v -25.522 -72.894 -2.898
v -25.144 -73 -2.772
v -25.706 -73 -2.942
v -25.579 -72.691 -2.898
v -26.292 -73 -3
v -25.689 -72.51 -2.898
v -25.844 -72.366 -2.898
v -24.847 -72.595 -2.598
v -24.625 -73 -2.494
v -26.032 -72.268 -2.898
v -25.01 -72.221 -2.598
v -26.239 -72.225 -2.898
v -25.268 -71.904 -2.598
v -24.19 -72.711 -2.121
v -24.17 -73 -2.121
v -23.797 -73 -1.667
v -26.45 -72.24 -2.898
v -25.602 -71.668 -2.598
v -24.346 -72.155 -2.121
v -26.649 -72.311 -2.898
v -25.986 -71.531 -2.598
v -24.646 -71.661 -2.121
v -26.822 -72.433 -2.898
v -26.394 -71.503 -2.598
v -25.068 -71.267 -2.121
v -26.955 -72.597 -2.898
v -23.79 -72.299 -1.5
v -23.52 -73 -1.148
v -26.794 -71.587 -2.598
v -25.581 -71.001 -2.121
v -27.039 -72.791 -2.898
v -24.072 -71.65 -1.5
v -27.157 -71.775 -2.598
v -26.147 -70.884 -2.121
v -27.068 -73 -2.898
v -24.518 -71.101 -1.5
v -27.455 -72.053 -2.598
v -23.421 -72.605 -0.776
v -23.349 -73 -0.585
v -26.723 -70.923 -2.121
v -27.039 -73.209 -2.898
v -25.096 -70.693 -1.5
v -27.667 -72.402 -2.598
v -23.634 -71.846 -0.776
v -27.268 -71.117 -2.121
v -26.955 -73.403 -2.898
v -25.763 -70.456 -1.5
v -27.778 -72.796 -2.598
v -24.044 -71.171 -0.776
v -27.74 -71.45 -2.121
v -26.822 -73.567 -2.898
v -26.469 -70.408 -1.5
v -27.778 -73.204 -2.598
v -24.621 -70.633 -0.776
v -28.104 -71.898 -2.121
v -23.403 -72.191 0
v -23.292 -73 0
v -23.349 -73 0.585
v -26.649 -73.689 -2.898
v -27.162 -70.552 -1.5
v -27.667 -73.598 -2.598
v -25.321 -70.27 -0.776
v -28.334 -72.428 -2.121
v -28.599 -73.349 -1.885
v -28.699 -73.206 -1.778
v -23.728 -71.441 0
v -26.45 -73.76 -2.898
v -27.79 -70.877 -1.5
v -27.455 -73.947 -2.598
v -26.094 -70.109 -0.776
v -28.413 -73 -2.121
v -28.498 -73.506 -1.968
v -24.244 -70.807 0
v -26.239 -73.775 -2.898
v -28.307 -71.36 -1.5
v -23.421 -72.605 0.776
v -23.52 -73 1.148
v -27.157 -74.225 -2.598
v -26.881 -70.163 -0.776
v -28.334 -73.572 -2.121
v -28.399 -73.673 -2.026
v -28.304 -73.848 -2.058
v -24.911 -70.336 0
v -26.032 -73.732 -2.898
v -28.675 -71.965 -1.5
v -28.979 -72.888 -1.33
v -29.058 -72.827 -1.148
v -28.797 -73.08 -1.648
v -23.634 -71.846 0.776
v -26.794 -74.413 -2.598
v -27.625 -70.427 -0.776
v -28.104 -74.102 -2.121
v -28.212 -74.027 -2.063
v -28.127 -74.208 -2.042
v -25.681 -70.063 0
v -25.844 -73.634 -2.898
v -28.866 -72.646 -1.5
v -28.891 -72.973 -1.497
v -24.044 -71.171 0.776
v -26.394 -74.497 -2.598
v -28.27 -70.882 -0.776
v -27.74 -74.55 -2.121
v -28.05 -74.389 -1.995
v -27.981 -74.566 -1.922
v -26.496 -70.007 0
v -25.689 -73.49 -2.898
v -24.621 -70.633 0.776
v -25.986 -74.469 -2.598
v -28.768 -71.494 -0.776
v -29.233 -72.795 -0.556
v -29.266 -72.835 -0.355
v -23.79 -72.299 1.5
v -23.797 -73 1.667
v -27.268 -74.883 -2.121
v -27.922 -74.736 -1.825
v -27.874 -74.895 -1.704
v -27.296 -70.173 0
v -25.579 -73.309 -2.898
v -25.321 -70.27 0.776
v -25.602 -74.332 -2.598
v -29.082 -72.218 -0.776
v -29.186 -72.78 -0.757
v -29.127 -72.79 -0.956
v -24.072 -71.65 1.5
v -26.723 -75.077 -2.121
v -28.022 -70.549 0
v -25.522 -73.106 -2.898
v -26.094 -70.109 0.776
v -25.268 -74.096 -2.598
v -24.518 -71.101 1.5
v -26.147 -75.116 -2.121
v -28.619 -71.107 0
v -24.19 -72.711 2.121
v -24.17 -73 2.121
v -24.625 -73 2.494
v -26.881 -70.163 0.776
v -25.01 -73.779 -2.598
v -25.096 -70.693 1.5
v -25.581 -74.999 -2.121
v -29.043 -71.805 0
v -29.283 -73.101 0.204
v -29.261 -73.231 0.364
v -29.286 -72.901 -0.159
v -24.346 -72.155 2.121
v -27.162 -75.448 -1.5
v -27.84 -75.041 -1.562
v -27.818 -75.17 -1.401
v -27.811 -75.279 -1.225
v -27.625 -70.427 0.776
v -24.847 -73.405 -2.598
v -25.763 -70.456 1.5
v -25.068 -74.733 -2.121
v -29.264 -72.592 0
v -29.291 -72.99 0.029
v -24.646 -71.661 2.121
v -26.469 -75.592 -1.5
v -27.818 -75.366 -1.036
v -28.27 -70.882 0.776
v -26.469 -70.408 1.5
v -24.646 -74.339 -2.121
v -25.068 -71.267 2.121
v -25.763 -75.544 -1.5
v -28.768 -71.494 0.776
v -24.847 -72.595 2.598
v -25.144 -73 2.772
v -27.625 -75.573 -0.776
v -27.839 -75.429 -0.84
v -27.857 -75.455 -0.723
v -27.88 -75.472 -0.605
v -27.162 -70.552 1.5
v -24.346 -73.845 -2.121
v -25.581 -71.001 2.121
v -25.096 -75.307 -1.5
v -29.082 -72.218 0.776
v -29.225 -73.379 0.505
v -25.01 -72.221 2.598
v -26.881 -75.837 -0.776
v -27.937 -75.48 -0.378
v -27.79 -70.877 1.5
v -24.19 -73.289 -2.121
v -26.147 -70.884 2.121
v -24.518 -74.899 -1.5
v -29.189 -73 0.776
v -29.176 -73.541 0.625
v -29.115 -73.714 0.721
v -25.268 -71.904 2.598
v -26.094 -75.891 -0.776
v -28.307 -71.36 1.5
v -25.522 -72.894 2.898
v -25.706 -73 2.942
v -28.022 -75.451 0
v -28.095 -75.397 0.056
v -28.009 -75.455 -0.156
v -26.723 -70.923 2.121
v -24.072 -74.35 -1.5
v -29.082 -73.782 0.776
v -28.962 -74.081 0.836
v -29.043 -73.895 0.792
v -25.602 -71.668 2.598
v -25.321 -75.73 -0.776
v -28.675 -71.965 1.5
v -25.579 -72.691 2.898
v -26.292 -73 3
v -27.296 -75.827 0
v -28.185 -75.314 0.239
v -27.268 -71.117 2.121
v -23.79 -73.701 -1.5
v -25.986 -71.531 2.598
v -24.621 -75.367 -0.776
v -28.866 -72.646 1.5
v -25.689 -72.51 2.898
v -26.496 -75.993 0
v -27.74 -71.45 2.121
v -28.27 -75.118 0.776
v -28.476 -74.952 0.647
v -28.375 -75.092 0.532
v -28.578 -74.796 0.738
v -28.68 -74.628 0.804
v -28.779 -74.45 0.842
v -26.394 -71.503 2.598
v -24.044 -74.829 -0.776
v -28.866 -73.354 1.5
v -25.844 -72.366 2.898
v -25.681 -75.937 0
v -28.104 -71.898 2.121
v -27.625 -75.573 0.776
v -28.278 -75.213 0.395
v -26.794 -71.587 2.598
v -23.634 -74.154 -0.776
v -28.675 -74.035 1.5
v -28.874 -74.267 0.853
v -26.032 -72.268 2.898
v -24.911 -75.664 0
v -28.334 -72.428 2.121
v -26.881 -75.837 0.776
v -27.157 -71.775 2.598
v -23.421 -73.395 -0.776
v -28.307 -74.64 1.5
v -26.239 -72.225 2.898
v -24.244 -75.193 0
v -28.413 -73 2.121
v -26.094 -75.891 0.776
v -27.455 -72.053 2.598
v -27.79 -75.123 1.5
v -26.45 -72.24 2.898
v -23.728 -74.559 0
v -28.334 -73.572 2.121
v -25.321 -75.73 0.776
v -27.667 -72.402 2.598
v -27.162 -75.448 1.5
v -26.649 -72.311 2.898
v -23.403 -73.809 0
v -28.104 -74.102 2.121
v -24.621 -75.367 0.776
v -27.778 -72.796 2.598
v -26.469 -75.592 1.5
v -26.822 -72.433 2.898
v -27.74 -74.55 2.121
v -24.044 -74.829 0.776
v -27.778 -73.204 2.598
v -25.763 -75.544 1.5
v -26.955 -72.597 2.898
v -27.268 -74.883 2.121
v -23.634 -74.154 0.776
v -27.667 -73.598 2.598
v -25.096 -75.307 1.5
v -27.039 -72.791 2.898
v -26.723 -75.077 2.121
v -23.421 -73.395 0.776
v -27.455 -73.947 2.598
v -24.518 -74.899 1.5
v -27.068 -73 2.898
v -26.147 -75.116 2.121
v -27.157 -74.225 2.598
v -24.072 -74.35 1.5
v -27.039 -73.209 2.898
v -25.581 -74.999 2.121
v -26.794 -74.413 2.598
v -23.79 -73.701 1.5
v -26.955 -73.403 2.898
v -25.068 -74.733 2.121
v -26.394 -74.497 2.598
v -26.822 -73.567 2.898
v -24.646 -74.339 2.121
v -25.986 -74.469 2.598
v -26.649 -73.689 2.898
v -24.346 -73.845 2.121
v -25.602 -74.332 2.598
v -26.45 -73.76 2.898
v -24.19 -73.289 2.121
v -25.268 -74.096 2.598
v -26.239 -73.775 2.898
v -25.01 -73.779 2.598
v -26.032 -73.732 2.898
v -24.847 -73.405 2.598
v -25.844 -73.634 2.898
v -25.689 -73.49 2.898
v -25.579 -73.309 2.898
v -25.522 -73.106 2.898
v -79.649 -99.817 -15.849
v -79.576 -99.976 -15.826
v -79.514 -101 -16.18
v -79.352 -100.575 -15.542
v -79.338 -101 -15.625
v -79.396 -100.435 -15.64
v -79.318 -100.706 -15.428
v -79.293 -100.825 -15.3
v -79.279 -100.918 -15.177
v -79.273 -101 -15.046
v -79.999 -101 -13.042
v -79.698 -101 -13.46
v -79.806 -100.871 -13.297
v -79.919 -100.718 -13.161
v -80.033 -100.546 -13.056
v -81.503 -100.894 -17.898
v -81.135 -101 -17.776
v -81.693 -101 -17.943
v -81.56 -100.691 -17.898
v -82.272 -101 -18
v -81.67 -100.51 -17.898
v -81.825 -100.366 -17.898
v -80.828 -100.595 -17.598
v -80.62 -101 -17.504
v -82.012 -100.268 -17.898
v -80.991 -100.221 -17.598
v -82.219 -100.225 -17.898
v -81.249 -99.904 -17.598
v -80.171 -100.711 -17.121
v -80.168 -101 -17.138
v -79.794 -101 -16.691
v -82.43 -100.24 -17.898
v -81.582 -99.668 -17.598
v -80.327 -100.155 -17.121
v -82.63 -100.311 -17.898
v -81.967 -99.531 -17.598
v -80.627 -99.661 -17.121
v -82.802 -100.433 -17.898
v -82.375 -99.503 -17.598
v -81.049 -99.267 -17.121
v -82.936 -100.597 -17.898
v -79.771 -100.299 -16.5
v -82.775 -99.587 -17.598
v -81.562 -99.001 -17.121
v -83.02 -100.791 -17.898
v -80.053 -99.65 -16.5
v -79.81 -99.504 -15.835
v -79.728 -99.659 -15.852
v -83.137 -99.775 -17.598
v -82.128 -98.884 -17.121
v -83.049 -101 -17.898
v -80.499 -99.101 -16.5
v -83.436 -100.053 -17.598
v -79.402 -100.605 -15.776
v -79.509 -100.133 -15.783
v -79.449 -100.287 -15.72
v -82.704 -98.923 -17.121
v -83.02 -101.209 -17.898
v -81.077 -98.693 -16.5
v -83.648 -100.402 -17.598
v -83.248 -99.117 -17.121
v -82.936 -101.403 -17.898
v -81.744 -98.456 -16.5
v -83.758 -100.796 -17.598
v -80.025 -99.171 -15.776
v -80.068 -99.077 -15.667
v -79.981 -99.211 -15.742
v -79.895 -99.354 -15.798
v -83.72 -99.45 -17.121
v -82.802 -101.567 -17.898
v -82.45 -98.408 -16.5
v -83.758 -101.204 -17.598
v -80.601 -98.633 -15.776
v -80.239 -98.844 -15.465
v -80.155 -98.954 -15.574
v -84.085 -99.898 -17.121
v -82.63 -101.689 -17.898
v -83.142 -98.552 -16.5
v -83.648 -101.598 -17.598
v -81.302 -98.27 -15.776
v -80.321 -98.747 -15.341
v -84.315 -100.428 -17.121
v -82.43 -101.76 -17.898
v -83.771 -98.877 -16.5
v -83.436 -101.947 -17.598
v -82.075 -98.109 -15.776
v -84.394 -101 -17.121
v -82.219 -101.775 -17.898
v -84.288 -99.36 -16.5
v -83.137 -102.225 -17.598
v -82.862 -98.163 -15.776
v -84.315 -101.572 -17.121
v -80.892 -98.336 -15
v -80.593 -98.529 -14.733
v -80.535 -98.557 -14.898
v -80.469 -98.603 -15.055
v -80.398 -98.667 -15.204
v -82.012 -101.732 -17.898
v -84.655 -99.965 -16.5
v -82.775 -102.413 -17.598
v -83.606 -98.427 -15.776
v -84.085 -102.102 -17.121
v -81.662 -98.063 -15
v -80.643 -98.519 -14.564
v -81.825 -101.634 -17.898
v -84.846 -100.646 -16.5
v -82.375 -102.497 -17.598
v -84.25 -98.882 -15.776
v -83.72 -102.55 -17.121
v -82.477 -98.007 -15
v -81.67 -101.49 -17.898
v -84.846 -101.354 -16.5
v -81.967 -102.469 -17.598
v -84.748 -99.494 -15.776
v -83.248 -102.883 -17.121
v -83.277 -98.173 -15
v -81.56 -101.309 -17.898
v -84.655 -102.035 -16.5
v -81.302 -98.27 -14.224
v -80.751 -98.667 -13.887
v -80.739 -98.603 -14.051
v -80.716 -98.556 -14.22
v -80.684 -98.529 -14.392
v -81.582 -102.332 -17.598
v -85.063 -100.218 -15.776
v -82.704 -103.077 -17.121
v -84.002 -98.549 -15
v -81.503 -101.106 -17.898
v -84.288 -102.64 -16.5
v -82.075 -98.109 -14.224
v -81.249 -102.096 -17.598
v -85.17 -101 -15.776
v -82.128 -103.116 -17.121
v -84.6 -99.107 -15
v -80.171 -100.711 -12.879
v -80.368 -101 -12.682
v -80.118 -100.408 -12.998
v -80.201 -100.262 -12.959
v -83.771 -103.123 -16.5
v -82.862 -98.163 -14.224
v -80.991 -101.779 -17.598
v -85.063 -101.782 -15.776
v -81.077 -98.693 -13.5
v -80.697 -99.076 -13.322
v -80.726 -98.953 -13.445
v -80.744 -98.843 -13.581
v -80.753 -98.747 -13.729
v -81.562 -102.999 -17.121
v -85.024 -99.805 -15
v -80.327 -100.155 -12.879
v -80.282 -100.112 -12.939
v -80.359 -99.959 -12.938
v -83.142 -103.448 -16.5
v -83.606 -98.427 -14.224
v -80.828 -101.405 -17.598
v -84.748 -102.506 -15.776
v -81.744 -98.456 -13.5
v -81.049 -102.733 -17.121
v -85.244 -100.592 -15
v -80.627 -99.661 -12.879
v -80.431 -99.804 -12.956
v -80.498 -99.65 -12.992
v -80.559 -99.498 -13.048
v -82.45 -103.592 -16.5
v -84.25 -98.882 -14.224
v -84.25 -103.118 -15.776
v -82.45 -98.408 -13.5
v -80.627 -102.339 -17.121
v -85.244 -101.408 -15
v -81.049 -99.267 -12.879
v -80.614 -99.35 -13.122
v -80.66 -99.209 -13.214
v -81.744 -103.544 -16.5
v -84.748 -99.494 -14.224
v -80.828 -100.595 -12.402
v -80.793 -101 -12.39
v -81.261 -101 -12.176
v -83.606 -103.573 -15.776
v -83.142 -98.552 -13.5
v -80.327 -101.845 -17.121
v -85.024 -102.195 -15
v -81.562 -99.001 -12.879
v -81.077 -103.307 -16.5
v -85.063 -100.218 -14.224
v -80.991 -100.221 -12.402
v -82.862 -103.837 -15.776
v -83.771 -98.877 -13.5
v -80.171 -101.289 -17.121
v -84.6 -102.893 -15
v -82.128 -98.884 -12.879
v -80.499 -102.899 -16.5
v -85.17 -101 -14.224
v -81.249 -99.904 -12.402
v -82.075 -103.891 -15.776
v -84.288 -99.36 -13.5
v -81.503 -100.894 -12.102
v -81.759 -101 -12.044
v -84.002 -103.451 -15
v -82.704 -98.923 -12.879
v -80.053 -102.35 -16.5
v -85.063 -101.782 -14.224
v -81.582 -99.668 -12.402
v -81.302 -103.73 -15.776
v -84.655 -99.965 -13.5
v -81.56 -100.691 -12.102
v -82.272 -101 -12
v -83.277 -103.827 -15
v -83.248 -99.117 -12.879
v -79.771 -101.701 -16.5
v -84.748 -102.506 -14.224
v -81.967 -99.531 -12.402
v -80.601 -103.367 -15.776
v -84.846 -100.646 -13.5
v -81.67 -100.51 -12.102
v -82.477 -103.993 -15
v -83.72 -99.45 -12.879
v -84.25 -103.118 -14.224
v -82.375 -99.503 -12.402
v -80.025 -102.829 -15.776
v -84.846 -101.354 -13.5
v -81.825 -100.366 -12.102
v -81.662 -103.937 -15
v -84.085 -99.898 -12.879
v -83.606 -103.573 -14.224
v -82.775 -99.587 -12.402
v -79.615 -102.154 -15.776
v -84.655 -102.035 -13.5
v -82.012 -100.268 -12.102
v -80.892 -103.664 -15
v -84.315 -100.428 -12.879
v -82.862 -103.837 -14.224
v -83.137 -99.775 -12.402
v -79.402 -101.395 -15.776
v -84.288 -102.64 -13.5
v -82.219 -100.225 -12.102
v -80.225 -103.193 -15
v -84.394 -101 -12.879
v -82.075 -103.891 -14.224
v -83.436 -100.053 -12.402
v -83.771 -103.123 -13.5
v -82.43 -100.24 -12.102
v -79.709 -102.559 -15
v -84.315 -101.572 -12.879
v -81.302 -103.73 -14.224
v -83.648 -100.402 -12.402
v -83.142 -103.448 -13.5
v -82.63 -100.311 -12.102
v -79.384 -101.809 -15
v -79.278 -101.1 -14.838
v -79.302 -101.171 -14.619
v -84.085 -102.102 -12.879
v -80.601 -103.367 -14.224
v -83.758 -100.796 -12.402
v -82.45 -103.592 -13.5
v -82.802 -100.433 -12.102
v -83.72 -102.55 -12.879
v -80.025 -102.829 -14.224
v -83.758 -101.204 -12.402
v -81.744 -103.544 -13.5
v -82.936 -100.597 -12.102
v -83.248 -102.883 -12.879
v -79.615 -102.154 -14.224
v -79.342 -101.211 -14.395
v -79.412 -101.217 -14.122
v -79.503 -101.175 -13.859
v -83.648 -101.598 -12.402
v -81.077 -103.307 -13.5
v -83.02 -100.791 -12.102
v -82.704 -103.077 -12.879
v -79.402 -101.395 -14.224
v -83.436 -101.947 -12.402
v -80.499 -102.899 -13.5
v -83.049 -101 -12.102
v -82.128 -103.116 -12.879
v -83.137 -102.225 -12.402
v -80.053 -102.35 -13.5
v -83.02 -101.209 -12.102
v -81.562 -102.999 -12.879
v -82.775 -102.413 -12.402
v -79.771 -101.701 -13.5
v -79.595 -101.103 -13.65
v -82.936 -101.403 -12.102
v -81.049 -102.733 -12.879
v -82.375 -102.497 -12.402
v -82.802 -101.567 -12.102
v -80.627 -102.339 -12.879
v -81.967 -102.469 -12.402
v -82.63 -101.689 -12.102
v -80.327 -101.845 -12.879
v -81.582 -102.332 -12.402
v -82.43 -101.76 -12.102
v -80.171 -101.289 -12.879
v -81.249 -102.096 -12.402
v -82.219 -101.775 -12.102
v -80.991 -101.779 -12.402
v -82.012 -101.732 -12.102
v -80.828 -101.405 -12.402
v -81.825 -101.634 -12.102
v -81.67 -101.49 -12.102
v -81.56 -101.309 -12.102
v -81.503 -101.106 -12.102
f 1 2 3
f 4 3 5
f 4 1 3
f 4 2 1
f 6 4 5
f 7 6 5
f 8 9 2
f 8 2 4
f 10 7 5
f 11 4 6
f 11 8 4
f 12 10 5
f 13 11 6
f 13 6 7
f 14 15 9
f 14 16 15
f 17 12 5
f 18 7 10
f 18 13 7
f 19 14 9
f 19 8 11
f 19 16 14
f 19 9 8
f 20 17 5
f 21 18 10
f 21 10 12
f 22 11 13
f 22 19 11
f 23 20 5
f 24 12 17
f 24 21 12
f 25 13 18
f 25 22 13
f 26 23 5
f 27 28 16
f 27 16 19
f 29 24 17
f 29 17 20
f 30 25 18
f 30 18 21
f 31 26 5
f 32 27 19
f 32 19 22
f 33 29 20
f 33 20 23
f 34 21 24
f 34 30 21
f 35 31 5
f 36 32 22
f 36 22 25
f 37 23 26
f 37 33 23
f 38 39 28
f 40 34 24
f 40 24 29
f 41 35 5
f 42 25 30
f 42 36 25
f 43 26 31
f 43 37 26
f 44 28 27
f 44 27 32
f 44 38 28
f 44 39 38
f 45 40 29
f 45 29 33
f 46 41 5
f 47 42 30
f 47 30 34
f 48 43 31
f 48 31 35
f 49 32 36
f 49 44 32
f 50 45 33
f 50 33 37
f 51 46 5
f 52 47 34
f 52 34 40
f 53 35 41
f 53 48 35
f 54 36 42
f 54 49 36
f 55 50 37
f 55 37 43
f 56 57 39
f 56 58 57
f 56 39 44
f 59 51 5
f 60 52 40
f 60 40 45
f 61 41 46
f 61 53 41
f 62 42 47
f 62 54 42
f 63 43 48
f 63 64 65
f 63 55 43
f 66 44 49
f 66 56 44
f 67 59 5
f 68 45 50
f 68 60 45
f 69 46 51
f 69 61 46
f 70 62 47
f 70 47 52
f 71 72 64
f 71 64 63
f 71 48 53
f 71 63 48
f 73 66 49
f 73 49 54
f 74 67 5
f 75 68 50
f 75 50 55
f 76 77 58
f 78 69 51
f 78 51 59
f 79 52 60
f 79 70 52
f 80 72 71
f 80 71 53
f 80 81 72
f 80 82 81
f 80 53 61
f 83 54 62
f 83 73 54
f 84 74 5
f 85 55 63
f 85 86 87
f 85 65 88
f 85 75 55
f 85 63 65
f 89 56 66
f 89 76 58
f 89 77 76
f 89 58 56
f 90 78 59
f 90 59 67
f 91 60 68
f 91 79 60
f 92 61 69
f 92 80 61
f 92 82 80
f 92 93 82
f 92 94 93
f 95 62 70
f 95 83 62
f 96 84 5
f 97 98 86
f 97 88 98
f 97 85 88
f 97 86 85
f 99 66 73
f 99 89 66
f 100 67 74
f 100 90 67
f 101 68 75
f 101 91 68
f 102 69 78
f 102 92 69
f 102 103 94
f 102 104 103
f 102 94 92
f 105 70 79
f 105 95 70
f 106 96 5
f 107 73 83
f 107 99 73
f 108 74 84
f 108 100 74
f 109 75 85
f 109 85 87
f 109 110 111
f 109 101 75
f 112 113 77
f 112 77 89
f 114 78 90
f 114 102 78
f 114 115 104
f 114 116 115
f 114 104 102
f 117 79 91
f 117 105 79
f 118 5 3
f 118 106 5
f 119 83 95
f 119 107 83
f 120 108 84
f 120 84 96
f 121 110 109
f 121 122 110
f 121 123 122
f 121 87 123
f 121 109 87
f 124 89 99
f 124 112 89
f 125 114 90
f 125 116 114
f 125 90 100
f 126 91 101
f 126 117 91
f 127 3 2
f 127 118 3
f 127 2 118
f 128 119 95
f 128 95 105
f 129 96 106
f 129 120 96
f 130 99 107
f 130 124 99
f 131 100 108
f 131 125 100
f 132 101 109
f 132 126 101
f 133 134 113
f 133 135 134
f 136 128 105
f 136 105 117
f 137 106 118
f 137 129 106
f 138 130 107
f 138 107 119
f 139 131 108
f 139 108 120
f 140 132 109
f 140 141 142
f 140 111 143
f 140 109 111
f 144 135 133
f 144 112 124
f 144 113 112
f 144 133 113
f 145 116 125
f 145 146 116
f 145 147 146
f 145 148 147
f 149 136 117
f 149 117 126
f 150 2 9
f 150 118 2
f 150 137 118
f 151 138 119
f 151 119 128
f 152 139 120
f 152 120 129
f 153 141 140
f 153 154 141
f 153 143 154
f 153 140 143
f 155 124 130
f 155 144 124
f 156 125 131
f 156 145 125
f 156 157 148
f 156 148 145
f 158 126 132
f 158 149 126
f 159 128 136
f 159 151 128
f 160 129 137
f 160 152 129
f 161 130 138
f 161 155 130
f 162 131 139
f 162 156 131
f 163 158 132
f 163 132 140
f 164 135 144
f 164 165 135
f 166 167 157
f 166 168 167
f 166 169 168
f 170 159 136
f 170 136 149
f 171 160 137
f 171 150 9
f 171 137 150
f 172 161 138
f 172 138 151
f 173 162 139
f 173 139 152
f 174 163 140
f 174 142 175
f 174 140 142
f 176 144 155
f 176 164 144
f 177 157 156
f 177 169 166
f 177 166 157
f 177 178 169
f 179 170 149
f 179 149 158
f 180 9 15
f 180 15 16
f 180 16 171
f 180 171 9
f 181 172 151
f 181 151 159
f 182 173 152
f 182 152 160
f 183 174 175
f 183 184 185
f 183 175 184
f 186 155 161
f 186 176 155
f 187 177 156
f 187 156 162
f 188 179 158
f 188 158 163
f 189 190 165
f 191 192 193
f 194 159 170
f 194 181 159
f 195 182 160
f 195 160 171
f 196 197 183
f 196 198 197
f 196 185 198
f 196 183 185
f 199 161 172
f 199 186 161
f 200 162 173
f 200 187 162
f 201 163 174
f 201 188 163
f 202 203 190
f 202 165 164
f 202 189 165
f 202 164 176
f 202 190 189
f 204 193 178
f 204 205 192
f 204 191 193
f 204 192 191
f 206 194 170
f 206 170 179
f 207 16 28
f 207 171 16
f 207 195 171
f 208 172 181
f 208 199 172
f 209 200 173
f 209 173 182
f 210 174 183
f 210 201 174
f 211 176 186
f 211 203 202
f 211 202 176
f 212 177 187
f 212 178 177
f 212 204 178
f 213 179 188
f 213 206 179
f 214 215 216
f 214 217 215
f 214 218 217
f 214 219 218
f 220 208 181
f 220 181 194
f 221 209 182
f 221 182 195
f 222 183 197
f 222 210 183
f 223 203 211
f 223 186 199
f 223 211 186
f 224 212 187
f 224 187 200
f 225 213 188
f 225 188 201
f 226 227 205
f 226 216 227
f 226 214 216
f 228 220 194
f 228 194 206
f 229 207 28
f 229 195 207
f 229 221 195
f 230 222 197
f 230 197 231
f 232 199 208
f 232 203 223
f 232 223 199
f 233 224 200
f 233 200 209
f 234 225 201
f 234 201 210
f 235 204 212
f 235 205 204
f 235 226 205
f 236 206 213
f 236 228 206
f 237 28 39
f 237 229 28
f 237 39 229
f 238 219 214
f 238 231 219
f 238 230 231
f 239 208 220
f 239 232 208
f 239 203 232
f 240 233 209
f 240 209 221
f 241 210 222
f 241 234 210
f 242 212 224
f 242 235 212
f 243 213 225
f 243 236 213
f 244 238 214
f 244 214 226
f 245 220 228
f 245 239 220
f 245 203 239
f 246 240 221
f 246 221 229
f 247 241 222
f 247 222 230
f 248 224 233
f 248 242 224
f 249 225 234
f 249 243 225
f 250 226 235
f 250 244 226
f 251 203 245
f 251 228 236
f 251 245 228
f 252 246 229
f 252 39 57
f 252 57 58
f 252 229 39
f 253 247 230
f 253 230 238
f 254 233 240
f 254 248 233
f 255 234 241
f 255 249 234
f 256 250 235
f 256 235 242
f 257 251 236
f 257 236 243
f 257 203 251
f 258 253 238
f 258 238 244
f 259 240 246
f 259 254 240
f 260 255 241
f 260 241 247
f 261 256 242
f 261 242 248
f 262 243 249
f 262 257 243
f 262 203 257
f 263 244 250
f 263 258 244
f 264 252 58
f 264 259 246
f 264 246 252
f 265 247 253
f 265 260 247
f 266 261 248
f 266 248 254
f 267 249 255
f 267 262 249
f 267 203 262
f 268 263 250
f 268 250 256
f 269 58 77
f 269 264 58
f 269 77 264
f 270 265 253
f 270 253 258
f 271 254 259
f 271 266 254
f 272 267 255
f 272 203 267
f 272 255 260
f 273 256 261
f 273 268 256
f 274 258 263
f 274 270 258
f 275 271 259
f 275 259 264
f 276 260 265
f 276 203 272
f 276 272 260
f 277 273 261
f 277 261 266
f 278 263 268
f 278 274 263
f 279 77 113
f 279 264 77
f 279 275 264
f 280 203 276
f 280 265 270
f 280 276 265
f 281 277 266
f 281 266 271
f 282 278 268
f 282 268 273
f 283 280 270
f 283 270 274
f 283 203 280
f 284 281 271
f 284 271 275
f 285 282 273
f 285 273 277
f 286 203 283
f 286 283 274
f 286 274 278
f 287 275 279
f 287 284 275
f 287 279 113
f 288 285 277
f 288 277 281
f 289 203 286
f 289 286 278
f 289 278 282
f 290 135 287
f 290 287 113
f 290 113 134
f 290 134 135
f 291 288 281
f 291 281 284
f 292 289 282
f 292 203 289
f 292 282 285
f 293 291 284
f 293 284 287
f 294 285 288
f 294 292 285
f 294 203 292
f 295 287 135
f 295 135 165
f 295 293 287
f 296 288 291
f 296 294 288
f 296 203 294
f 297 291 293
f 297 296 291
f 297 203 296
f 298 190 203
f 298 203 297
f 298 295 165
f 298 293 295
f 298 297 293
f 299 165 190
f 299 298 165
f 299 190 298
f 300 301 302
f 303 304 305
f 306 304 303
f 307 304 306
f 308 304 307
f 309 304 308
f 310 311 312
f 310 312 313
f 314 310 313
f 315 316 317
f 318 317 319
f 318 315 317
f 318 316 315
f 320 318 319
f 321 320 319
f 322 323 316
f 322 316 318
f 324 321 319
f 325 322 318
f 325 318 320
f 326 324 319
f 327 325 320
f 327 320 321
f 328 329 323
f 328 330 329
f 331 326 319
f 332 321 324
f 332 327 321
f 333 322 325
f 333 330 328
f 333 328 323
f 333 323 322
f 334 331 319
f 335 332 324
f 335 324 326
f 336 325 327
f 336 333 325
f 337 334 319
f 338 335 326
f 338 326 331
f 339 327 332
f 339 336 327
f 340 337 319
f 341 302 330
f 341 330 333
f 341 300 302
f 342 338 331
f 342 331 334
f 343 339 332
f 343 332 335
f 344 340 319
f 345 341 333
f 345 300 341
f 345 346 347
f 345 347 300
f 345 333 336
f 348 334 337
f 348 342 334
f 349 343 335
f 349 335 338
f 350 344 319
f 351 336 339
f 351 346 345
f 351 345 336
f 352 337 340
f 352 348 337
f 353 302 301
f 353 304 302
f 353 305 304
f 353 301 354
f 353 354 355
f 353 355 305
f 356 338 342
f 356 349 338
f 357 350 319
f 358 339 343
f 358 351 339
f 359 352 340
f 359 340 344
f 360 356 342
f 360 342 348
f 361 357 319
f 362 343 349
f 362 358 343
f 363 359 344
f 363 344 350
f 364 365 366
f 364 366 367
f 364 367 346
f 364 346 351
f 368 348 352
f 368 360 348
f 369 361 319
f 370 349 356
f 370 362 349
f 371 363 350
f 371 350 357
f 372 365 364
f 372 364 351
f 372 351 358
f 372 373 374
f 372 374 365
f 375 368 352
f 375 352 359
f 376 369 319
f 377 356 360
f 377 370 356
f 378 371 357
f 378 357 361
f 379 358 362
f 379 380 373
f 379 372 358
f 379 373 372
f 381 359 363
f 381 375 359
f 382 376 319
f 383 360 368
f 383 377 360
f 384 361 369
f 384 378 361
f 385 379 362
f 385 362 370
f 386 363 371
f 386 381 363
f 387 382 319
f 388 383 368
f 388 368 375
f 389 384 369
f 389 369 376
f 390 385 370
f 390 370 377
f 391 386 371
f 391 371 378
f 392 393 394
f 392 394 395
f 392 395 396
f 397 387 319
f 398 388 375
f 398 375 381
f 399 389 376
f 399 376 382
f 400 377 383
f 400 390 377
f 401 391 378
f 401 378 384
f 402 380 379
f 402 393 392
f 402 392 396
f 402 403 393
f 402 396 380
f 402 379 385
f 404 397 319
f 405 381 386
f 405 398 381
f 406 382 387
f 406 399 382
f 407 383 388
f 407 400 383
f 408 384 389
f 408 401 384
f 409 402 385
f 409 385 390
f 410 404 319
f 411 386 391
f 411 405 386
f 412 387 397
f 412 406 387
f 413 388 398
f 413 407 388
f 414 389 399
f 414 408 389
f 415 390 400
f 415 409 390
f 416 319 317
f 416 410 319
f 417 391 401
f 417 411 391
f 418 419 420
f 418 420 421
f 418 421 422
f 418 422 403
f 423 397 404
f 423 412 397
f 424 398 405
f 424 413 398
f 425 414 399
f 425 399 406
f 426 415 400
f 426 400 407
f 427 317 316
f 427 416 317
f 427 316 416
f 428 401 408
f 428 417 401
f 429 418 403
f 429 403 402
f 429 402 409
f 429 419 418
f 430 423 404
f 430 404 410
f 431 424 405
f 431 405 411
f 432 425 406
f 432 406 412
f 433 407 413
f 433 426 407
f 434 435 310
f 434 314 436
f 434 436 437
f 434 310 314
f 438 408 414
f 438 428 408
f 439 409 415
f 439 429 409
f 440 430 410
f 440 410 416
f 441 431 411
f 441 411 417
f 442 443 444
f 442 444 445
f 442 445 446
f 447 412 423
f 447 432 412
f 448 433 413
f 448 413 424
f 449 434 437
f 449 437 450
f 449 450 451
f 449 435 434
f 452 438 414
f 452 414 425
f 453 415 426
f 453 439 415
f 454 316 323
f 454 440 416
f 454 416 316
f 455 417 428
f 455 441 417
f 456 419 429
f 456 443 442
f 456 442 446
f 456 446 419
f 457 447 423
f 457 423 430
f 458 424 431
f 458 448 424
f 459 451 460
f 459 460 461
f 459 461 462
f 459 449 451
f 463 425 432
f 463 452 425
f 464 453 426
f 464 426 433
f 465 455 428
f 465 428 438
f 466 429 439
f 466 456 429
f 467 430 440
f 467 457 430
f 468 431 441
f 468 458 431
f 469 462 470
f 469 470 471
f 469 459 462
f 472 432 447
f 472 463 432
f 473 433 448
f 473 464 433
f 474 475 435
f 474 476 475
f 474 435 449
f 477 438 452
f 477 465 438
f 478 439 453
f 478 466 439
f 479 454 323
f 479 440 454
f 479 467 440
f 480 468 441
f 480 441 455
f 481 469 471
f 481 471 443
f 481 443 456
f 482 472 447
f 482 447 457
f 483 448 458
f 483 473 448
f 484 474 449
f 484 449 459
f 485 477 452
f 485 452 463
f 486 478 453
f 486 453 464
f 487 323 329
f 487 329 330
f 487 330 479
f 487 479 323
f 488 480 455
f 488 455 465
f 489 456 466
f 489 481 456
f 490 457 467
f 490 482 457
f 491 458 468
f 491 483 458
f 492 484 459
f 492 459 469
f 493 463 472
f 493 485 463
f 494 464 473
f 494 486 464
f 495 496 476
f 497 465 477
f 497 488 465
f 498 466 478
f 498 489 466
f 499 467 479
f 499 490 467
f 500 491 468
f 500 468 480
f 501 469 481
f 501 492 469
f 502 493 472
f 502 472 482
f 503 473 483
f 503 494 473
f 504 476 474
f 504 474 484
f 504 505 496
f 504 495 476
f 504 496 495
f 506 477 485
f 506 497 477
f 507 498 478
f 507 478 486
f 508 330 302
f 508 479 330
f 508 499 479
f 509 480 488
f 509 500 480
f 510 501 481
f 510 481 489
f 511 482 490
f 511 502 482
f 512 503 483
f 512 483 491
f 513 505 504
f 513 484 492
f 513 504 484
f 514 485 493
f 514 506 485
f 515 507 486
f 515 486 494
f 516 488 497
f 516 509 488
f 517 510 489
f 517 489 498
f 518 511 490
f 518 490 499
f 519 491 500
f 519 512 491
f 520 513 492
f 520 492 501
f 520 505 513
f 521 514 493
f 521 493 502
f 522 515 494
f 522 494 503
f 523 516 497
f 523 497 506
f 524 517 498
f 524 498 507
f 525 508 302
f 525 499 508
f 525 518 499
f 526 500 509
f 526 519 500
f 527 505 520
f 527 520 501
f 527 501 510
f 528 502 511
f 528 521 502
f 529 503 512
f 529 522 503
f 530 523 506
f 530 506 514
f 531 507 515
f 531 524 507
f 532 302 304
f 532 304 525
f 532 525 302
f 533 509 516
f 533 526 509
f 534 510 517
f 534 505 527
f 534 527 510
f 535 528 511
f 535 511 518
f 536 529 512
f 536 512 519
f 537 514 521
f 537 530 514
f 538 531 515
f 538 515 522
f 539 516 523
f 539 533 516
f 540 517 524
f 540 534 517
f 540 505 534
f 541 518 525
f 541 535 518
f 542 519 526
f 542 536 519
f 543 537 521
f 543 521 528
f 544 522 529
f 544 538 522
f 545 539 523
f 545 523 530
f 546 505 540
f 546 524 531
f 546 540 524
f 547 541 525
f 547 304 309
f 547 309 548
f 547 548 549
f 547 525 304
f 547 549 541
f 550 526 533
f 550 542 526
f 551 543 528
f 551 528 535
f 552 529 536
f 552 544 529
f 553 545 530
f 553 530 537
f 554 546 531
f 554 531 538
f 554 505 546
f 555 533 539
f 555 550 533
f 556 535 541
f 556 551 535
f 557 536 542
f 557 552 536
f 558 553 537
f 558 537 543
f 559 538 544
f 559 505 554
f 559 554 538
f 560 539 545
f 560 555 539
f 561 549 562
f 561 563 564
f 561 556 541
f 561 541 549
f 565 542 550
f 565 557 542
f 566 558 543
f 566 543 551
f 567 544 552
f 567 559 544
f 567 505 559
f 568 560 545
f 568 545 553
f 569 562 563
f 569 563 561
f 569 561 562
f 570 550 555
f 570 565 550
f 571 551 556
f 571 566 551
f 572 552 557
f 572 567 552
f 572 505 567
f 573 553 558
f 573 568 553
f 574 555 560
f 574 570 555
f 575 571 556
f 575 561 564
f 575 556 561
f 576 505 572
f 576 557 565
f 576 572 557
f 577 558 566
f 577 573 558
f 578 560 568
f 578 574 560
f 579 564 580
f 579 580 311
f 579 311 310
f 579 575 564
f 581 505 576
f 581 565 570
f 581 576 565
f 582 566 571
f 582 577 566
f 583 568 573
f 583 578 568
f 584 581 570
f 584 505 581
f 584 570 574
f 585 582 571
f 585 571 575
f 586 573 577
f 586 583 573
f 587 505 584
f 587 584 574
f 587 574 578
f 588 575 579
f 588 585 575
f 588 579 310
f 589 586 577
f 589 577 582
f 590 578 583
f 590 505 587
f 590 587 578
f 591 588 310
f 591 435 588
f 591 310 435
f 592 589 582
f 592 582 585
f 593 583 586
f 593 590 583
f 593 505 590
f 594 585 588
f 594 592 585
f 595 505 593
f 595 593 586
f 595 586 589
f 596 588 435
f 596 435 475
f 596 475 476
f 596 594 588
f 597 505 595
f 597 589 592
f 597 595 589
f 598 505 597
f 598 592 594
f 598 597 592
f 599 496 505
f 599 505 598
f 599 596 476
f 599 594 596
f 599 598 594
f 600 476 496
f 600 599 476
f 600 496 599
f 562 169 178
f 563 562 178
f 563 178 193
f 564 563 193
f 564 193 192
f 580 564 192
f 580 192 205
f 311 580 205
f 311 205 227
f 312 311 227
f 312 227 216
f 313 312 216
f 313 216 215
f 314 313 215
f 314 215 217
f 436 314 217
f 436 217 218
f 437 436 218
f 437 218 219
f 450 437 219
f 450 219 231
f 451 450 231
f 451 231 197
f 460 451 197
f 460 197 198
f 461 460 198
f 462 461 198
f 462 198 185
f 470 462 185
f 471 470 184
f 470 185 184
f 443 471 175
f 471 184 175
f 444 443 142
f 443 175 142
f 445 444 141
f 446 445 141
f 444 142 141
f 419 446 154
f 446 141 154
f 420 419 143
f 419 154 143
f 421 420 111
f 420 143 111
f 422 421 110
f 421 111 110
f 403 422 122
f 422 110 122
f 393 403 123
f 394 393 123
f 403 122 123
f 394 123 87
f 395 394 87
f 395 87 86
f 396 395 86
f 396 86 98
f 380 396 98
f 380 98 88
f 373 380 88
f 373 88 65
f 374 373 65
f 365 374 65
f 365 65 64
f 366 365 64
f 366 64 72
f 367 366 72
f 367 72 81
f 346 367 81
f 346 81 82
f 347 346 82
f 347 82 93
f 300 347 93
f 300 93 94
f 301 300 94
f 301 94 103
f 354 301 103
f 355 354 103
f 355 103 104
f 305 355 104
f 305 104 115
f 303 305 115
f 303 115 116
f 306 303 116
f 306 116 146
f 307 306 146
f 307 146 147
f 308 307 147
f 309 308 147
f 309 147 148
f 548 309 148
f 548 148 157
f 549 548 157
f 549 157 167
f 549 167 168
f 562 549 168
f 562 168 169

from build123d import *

# Parameters (mm, degrees)
THREE_MILLIMETRE_STRUT_CORE_SKETCH_R = 1.5
THREE_MILLIMETRE_STRUT_CORE_DEPTH    = 64.364941753


with BuildPart() as part:
    # Three millimetre strut core sketch → Three millimetre strut core (new body)
    with BuildSketch(Plane(origin=(-47.508082523, -23.76220438, -12.729752346), x_dir=(-0.20842845999452628, -0.10425004340144392, 0.9724656834640013), z_dir=(-0.8697399638531149, -0.435019425763827, -0.23304612093938143))):
        with Locations(Location((13.090181548, -53.527480937, 0), (0, 0, 270))):
            Circle(THREE_MILLIMETRE_STRUT_CORE_SKETCH_R)
    extrude(amount=THREE_MILLIMETRE_STRUT_CORE_DEPTH)

    # Ball end 1 profile → Ball end 1 (revolve)
    with BuildSketch(Plane(origin=(0, -73, 0), x_dir=(-1, 0, 0), z_dir=(0, -1, 0))):
        with BuildLine():
            Line((26.291651246, -3), (26.291651246, 3))
            ThreePointArc((26.291651246, 3), (23.291651246, 0), (26.291651246, -3))
        make_face()
    revolve(axis=Axis((-26.291651246, -73, -10), (0, 0, 1)))

    # Ball end 2 profile → Ball end 2 (revolve)
    with BuildSketch(Plane(origin=(0, -101.000000001, 0), x_dir=(-1, 0, 0), z_dir=(0, -1, 0))):
        with BuildLine():
            Line((82.272413359, 12), (82.272413359, 18))
            ThreePointArc((82.272413359, 18), (79.272413359, 15), (82.272413359, 12))
        make_face()
    revolve(axis=Axis((-82.272413359, -101.000000001, -25), (0, 0, 1)))


solid = part.part
